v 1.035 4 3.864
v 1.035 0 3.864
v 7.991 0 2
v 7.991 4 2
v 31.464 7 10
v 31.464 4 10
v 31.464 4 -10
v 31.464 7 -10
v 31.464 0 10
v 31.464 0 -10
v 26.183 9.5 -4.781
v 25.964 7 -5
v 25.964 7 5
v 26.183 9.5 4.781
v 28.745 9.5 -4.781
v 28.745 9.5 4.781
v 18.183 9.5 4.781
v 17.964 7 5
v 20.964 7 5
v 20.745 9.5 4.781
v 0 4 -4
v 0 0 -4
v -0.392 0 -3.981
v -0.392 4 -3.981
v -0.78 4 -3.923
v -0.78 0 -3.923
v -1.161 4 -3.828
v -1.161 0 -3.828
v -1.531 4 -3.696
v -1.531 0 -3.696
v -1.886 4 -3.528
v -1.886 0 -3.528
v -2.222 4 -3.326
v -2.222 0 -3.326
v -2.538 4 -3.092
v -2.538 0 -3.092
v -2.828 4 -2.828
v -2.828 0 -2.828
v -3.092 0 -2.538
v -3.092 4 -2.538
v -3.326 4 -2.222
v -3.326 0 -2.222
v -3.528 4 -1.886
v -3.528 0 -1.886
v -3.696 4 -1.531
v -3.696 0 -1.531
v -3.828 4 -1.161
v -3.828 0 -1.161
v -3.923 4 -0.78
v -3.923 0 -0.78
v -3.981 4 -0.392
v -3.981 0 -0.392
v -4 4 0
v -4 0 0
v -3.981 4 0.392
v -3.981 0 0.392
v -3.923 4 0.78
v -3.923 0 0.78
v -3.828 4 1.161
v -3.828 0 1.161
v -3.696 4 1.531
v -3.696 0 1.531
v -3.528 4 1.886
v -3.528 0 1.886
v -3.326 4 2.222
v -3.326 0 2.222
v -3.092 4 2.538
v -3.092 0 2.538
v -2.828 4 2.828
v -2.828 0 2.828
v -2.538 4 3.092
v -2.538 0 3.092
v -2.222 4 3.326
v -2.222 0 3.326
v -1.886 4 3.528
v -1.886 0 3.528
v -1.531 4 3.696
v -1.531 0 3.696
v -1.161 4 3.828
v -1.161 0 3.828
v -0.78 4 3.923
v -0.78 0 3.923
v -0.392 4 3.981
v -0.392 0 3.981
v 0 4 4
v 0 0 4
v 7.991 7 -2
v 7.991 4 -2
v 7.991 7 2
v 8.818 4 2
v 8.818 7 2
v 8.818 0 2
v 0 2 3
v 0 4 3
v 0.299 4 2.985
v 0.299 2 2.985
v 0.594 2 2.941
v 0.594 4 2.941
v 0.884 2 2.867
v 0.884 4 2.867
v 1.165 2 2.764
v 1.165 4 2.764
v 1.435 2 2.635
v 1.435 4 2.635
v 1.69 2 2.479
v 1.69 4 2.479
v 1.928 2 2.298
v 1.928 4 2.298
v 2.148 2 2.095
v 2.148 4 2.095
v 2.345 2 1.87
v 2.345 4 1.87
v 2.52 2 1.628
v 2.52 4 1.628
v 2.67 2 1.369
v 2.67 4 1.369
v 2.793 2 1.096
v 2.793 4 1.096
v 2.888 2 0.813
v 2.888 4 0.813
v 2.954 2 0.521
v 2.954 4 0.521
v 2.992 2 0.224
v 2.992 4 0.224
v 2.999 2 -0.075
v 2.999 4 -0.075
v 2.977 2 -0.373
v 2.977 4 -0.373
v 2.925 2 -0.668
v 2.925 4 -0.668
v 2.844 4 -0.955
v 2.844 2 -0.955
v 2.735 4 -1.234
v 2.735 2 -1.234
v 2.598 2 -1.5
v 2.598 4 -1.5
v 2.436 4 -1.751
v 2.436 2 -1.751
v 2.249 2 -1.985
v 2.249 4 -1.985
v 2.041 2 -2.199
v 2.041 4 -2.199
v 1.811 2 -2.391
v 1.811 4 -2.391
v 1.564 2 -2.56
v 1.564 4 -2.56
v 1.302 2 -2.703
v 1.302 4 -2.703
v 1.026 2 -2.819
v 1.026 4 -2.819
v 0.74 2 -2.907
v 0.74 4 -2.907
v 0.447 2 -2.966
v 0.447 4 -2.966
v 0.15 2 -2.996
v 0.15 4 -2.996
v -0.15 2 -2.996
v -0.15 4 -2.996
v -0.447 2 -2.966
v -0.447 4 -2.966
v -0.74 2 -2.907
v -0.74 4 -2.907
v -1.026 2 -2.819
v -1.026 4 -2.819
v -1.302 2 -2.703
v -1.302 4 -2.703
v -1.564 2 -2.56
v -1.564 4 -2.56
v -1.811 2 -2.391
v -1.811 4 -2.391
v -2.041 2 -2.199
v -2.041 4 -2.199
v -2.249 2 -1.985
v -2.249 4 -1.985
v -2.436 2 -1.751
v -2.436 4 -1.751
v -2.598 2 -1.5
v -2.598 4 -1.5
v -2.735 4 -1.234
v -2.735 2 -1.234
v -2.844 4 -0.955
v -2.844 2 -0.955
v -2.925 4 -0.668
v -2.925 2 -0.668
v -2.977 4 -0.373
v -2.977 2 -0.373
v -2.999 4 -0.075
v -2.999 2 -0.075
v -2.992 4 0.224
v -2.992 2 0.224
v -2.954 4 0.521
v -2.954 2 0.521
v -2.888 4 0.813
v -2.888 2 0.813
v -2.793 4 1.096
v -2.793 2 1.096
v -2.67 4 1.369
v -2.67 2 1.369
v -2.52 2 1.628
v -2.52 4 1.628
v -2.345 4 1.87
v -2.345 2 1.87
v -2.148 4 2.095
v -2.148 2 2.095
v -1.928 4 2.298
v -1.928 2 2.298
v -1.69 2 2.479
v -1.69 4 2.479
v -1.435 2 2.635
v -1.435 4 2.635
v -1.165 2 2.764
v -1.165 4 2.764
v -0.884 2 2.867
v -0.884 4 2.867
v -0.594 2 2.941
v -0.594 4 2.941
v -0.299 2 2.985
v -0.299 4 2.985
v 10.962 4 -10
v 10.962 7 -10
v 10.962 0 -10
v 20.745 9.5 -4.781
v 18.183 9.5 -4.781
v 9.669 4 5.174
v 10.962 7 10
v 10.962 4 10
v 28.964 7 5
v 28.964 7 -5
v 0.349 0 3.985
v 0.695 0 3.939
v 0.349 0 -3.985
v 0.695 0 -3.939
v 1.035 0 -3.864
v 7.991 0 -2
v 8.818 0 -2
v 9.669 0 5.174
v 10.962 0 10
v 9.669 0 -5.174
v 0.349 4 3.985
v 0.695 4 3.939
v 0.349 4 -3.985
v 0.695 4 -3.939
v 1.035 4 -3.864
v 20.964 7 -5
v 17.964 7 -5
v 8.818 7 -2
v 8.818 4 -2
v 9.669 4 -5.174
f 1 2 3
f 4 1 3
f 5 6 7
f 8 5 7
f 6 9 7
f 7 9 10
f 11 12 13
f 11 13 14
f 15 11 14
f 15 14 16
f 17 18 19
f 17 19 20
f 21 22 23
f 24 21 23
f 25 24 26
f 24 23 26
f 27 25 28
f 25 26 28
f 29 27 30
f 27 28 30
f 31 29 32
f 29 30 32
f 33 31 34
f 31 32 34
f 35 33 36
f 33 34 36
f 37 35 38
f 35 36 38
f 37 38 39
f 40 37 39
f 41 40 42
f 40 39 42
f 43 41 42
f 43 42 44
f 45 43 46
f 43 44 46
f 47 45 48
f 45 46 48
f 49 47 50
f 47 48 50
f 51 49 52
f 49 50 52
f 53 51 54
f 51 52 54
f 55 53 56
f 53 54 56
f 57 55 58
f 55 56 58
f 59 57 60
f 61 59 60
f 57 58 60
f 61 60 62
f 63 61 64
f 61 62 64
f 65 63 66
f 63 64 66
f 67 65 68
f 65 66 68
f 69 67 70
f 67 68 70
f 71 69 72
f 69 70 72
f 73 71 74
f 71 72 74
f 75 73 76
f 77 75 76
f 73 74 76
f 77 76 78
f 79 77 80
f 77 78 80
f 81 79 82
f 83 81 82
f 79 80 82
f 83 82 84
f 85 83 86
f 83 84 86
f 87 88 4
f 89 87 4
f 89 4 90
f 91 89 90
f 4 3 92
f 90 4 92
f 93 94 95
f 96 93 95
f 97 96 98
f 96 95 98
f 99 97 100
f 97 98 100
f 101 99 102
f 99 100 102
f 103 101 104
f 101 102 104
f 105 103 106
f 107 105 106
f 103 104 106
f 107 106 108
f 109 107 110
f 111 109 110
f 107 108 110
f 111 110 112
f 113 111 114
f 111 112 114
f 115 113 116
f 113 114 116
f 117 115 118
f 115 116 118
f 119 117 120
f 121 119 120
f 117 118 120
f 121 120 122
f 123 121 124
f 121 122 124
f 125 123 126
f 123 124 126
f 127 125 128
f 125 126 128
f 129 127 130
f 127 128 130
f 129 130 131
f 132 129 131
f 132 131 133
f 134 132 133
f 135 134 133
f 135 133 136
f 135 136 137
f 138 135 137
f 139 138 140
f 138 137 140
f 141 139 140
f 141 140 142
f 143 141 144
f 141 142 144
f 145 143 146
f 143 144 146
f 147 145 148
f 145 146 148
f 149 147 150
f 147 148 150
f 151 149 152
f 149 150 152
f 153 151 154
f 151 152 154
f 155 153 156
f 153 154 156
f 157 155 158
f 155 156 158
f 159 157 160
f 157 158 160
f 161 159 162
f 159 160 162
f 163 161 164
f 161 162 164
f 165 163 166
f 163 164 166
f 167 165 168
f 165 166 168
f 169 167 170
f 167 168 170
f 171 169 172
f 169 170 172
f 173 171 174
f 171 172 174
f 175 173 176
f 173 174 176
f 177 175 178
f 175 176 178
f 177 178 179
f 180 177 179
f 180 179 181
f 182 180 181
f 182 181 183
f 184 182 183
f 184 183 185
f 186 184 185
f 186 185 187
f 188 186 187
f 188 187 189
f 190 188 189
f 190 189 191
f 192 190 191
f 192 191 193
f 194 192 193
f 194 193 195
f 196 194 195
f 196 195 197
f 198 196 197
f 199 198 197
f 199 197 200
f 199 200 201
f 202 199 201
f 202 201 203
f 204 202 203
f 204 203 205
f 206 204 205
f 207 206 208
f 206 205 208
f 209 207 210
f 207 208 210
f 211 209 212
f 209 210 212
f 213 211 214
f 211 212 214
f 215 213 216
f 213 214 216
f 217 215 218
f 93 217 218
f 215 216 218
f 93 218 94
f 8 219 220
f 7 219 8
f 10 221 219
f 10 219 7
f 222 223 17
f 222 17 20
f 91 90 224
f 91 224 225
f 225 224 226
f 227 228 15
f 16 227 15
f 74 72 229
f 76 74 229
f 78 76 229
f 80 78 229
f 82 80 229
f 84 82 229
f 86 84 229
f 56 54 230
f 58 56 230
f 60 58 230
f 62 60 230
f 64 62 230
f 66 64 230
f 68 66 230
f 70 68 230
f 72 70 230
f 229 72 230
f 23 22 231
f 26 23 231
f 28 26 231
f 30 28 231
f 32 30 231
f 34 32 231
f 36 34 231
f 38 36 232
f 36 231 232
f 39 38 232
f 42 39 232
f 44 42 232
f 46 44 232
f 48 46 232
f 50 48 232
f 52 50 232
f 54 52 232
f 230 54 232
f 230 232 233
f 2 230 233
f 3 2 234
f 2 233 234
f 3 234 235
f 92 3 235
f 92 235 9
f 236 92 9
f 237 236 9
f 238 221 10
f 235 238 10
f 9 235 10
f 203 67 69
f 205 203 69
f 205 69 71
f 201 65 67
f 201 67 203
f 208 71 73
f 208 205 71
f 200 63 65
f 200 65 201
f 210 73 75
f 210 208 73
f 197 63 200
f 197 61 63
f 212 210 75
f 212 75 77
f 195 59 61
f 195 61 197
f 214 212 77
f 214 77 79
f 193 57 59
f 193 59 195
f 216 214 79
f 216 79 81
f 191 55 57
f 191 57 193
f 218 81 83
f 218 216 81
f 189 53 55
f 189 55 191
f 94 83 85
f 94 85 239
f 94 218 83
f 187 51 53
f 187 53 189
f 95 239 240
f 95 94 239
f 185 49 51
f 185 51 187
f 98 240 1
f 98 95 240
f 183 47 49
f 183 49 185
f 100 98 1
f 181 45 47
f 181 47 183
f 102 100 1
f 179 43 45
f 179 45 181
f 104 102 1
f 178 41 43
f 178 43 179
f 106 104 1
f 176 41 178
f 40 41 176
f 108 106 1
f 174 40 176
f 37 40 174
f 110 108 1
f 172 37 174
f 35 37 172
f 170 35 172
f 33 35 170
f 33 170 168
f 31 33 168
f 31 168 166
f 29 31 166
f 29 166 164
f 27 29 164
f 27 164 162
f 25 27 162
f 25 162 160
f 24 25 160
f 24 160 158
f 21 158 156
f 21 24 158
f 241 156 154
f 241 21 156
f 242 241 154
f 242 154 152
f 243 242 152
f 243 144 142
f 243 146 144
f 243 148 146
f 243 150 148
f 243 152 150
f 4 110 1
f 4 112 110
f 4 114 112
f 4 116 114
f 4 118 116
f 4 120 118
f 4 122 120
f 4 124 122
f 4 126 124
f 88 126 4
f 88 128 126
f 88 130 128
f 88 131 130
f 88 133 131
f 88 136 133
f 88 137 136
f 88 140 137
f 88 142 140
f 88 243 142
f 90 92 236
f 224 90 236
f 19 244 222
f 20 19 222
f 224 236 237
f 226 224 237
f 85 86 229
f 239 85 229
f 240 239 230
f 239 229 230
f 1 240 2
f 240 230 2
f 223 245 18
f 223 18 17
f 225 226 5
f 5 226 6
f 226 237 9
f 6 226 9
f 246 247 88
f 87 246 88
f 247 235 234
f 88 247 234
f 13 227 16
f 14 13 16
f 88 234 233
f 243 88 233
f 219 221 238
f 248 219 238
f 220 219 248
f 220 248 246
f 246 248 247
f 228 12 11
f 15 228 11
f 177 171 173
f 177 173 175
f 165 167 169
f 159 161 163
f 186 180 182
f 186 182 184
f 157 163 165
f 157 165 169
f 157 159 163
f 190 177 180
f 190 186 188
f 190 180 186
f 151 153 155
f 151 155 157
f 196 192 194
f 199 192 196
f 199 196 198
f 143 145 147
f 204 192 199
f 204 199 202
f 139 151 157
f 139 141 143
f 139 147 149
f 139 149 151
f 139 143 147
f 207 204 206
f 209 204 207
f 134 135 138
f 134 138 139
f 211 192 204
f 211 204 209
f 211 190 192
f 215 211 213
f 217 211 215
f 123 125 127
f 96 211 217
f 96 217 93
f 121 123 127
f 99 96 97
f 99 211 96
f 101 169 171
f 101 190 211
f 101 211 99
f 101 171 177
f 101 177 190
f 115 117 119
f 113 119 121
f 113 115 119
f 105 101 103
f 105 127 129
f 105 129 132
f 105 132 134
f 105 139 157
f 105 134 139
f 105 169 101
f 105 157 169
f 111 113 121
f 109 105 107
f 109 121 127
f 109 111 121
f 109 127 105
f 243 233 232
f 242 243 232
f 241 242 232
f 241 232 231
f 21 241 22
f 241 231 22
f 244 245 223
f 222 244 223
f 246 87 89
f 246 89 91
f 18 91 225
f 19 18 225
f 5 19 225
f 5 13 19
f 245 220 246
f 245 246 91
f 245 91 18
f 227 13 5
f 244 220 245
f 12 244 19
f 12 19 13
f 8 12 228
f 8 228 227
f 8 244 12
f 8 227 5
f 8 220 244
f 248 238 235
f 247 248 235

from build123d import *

# Parameters (mm, degrees)
BOSS_EXTRUDE1_DEPTH     = 4
SKETCH2_R               = 3
CUT_EXTRUDE1_DEPTH      = 2
BOSS_EXTRUDE2_DEPTH     = 3
SKETCH24_W              = 20.502400247
SKETCH24_H              = 20
BOSS_EXTRUDE4_DEPTH     = 3
SKETCH26_W              = 3
SKETCH26_H              = 10
BOSS_EXTRUDE6_DEPTH     = 2.5
CUT_EXTRUDE2_DEPTH      = 10
CUT_EXTRUDE3_DEPTH      = 35.354616727
CUT_EXTRUDE3_DEPTH_BACK = 35.354616727


with BuildPart() as part:
    # Sketch1 → Boss-Extrude1 (new body)
    with BuildSketch(Plane(origin=(0, 0, 0), x_dir=(1, 0, 0), z_dir=(0, 1, 0))):
        with BuildLine():
            Line((31.464101615, 10), (10.961701368, 10))
            Line((10.961701368, 10), (9.668549449, 5.173891336))
            Line((9.668549449, 5.173891336), (8.818107828, 2))
            Line((8.818107828, 2), (7.990711605, 2))
            Line((7.990711605, 2), (1.03527618, 3.863703305))
            ThreePointArc((1.03527618, 3.863703305), (0.522104769, 3.965779445), (0, 4))
            ThreePointArc((0, 4), (-4, 0), (0, -4))
            ThreePointArc((0, -4), (0.522104769, -3.965779445), (1.03527618, -3.863703305))
            Line((1.03527618, -3.863703305), (7.990711605, -2))
            Line((7.990711605, -2), (8.818107828, -2))
            Line((8.818107828, -2), (9.668549449, -5.173891336))
            Line((9.668549449, -5.173891336), (10.961701368, -10))
            Line((10.961701368, -10), (31.464101615, -10))
            Line((31.464101615, -10), (31.464101615, 10))
        make_face()
    extrude(amount=BOSS_EXTRUDE1_DEPTH)

    # Sketch2 → Cut-Extrude1 (cut)
    with BuildSketch(Plane(origin=(0, 4, 0), x_dir=(1, 0, 0), z_dir=(0, 1, 0))):
        with Locations(Location((0, 0, 0), (0, 0, 270))):
            Circle(SKETCH2_R)
    extrude(amount=-CUT_EXTRUDE1_DEPTH, mode=Mode.SUBTRACT)

    # Sketch18 → Boss-Extrude2 (add)
    with BuildSketch(Plane(origin=(0, 4, 0), x_dir=(1, 0, 0), z_dir=(0, 1, 0))):
        Polygon((7.990711605, -2), (8.818107828, -2), (10.961701368, -10), (10.961701368, 10), (8.818107828, 2), (7.990711605, 2), align=None)
    extrude(amount=BOSS_EXTRUDE2_DEPTH)

    # Sketch24 → Boss-Extrude4 (add)
    with BuildSketch(Plane(origin=(0, 4, 0), x_dir=(1, 0, 0), z_dir=(0, 1, 0))):
        with Locations((21.212901491, 0)):
            Rectangle(SKETCH24_W, SKETCH24_H)
    extrude(amount=BOSS_EXTRUDE4_DEPTH)

    # Sketch26 → Boss-Extrude6 (add)
    with BuildSketch(Plane(origin=(0, 7, 0), x_dir=(1, 0, 0), z_dir=(0, 1, 0))):
        with Locations((27.464101615, 0)):
            Rectangle(SKETCH26_W, SKETCH26_H)
        with Locations((19.464101615, 0)):
            Rectangle(SKETCH26_W, SKETCH26_H)
    extrude(amount=BOSS_EXTRUDE6_DEPTH)

    # Sketch27 → Cut-Extrude2 (cut)
    with BuildSketch(Plane(origin=(0, 0, -5), x_dir=(-1, 0, 0), z_dir=(0, 0, -1))):
        Polygon((-28.964101615, 7), (-28.745379956, 9.5), (-28.964101615, 9.5), align=None)
        Polygon((-25.964101615, 7), (-26.182823274, 9.5), (-25.964101615, 9.5), align=None)
        Polygon((-20.964101615, 7), (-20.745379956, 9.5), (-20.964101615, 9.5), align=None)
        Polygon((-17.964101615, 7), (-18.182823274, 9.5), (-17.964101615, 9.5), align=None)
    extrude(amount=-CUT_EXTRUDE2_DEPTH, mode=Mode.SUBTRACT)

    # Sketch28 → Cut-Extrude3 (cut, two sides: drawn at the far end of the back side and taken through both)
    with BuildSketch(Plane(origin=(0, 0, 0), x_dir=(0, 0, -1), z_dir=(1, 0, 0)).offset(-CUT_EXTRUDE3_DEPTH_BACK)):
        Polygon((-5, 7), (-4.781278341, 9.5), (-5, 9.5), align=None)
        Polygon((5, 7), (4.781278341, 9.5), (5, 9.5), align=None)
    extrude(amount=CUT_EXTRUDE3_DEPTH + CUT_EXTRUDE3_DEPTH_BACK, mode=Mode.SUBTRACT)


solid = part.part
